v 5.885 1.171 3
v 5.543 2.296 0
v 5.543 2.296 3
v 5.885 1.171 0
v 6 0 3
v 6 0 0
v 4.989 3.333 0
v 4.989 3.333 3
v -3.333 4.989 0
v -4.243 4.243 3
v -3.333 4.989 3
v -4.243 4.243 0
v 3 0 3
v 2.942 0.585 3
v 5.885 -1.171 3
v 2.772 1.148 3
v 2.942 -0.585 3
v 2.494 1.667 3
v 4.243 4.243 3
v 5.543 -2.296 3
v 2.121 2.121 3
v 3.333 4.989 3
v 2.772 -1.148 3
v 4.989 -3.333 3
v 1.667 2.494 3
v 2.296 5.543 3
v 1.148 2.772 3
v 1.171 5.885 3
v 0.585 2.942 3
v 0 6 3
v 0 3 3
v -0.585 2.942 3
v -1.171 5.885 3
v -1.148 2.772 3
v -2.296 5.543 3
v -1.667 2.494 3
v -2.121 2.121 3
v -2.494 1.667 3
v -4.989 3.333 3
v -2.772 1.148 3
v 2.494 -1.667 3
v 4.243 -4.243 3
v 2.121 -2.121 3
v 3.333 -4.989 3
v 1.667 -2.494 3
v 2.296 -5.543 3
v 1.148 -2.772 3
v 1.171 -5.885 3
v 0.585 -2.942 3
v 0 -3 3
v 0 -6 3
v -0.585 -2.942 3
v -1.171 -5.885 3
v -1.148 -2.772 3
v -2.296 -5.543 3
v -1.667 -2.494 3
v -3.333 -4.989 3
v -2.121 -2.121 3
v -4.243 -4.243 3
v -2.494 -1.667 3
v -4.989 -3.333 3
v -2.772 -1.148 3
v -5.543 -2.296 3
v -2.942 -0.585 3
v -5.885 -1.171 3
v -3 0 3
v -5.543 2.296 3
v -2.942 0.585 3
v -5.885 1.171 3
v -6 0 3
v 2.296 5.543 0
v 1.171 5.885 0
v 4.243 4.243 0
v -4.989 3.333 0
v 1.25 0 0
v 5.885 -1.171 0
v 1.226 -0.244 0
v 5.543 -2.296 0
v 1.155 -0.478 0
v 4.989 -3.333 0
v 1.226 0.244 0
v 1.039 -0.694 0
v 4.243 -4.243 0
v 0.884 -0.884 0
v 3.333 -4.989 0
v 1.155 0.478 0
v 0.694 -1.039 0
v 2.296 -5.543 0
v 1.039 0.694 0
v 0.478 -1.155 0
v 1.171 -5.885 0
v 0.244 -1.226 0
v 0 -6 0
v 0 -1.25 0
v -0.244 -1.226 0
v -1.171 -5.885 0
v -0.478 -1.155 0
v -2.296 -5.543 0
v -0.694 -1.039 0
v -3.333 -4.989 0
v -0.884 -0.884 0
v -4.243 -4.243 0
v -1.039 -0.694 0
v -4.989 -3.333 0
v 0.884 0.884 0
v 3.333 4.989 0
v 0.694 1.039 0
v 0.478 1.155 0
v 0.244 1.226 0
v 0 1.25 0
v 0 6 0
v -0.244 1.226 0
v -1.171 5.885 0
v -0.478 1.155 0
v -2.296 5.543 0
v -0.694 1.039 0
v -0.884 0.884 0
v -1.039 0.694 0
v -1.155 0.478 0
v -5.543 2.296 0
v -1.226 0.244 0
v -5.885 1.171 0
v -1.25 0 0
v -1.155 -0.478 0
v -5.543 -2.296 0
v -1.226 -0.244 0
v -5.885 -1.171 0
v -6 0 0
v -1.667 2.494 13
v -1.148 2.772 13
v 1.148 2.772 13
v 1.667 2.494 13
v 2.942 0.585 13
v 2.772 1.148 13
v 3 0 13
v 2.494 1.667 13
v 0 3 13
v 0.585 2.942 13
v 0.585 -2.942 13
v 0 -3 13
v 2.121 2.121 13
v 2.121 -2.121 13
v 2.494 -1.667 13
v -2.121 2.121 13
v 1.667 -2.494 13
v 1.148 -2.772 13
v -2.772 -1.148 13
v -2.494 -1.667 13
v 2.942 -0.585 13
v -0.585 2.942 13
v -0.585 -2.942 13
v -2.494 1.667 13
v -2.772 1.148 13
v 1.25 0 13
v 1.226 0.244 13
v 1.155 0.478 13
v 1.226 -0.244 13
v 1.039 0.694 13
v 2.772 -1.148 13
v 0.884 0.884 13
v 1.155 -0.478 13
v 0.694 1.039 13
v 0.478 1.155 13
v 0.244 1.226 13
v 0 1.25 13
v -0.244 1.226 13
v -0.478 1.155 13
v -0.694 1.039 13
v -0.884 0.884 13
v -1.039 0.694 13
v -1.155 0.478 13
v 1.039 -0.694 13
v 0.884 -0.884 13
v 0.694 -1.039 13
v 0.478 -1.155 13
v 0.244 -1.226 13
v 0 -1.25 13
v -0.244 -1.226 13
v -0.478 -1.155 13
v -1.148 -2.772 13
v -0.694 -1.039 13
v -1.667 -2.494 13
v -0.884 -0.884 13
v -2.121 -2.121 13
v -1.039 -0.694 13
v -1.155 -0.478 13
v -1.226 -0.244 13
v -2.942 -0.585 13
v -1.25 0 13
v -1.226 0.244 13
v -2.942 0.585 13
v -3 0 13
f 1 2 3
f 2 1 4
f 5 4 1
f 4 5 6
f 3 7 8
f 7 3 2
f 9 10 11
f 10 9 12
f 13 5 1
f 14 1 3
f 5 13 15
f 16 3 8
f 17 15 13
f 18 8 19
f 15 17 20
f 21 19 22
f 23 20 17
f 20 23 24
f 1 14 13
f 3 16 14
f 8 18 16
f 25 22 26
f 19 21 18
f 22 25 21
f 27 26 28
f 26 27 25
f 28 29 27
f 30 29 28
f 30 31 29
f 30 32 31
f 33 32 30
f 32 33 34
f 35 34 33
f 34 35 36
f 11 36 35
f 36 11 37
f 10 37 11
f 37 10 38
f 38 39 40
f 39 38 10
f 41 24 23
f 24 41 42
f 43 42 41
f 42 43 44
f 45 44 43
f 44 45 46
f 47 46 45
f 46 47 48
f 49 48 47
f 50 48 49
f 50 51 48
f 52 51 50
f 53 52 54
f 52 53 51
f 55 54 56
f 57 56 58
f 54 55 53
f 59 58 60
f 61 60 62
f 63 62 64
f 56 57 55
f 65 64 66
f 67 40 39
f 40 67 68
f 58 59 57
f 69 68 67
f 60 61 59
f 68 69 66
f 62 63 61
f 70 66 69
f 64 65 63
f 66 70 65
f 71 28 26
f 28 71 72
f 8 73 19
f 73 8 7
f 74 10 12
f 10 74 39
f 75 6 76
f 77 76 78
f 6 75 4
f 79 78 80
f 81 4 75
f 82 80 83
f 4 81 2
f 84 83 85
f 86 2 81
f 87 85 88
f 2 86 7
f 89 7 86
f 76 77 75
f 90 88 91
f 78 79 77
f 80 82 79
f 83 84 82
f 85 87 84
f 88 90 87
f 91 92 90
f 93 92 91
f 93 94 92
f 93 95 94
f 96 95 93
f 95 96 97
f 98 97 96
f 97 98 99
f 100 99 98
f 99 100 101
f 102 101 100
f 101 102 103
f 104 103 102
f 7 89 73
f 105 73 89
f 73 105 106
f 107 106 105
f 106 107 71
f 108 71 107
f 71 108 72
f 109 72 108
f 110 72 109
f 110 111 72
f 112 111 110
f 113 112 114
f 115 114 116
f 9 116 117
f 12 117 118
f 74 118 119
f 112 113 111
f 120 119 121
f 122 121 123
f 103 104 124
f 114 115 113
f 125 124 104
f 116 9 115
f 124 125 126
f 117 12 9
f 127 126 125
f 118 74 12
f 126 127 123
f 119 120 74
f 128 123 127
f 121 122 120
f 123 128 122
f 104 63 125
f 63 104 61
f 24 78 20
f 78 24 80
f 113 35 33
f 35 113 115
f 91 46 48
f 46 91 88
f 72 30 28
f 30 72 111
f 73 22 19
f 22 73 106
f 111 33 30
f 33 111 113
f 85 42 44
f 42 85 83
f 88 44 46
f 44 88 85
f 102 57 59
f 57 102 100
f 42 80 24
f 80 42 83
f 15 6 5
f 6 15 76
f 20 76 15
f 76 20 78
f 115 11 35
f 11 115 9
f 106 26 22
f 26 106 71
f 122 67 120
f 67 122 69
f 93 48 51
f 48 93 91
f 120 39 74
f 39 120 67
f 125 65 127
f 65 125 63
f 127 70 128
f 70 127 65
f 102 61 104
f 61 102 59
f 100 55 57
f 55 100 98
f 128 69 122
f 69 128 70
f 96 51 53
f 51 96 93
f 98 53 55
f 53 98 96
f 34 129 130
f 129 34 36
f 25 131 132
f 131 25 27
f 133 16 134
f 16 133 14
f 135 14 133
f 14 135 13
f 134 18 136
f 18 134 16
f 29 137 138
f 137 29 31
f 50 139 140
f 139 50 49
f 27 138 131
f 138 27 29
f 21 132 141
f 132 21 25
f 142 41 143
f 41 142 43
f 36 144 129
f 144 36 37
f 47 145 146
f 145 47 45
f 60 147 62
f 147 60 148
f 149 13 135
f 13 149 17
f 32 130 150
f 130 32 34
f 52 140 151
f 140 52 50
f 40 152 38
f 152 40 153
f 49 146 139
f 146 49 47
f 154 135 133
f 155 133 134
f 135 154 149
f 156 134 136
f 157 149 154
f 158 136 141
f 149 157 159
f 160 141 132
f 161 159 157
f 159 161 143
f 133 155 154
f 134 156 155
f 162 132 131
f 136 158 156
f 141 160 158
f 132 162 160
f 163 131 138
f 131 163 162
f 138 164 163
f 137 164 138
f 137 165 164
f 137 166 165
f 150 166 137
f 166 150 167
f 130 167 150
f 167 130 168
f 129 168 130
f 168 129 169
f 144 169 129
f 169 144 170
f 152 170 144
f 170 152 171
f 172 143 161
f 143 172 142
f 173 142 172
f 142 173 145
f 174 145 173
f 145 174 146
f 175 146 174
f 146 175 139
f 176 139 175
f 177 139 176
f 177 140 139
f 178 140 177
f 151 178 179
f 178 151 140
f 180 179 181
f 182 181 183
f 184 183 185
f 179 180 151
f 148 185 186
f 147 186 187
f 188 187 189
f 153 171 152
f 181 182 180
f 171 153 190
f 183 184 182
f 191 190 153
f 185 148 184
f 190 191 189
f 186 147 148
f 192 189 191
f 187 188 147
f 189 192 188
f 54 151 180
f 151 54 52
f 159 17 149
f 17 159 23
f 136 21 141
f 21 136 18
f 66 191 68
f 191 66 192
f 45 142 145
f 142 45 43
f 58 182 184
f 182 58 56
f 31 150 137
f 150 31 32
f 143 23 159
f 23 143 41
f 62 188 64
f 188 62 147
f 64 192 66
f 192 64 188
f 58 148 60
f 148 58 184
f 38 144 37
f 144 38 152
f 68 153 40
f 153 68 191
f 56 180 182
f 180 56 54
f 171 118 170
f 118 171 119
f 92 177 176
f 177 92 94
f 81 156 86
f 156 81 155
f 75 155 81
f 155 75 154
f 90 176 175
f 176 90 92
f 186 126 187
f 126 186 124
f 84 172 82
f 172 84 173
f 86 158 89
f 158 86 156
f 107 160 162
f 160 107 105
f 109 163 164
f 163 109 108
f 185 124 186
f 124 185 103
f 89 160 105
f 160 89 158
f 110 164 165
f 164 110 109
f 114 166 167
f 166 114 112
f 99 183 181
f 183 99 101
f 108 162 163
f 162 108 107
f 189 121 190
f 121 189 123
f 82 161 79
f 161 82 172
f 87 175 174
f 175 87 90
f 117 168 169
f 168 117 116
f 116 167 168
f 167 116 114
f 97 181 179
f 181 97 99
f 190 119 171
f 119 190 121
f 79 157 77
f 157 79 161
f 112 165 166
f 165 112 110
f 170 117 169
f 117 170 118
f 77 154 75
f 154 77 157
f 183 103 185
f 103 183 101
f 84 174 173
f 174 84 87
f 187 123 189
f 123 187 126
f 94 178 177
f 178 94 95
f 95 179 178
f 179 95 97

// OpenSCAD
$fn = 32;

// ----------------------------------------------------------------------
// Micro post: flanged post, 5-20 mm class
// ----------------------------------------------------------------------

// --- parameters (mm) ---
post_d = 6;               // post diameter
post_h = 10;              // post height above the flange
flange_d = 12;            // flange diameter
flange_t = 3;             // flange thickness
bore_d = 2.5;             // through bore
fit_tol = 0.1;            // tolerance for press fits, mm
free_tol = 0.3;           // tolerance for clearance fits, mm

total_h = post_h + flange_t;  // overall height

difference() {
  union() {
    cylinder(h = flange_t, d = flange_d);
    translate([0, 0, flange_t]) cylinder(h = post_h, d = post_d);
  }
  translate([0, 0, -1]) cylinder(h = total_h + 2, d = bore_d);
}
